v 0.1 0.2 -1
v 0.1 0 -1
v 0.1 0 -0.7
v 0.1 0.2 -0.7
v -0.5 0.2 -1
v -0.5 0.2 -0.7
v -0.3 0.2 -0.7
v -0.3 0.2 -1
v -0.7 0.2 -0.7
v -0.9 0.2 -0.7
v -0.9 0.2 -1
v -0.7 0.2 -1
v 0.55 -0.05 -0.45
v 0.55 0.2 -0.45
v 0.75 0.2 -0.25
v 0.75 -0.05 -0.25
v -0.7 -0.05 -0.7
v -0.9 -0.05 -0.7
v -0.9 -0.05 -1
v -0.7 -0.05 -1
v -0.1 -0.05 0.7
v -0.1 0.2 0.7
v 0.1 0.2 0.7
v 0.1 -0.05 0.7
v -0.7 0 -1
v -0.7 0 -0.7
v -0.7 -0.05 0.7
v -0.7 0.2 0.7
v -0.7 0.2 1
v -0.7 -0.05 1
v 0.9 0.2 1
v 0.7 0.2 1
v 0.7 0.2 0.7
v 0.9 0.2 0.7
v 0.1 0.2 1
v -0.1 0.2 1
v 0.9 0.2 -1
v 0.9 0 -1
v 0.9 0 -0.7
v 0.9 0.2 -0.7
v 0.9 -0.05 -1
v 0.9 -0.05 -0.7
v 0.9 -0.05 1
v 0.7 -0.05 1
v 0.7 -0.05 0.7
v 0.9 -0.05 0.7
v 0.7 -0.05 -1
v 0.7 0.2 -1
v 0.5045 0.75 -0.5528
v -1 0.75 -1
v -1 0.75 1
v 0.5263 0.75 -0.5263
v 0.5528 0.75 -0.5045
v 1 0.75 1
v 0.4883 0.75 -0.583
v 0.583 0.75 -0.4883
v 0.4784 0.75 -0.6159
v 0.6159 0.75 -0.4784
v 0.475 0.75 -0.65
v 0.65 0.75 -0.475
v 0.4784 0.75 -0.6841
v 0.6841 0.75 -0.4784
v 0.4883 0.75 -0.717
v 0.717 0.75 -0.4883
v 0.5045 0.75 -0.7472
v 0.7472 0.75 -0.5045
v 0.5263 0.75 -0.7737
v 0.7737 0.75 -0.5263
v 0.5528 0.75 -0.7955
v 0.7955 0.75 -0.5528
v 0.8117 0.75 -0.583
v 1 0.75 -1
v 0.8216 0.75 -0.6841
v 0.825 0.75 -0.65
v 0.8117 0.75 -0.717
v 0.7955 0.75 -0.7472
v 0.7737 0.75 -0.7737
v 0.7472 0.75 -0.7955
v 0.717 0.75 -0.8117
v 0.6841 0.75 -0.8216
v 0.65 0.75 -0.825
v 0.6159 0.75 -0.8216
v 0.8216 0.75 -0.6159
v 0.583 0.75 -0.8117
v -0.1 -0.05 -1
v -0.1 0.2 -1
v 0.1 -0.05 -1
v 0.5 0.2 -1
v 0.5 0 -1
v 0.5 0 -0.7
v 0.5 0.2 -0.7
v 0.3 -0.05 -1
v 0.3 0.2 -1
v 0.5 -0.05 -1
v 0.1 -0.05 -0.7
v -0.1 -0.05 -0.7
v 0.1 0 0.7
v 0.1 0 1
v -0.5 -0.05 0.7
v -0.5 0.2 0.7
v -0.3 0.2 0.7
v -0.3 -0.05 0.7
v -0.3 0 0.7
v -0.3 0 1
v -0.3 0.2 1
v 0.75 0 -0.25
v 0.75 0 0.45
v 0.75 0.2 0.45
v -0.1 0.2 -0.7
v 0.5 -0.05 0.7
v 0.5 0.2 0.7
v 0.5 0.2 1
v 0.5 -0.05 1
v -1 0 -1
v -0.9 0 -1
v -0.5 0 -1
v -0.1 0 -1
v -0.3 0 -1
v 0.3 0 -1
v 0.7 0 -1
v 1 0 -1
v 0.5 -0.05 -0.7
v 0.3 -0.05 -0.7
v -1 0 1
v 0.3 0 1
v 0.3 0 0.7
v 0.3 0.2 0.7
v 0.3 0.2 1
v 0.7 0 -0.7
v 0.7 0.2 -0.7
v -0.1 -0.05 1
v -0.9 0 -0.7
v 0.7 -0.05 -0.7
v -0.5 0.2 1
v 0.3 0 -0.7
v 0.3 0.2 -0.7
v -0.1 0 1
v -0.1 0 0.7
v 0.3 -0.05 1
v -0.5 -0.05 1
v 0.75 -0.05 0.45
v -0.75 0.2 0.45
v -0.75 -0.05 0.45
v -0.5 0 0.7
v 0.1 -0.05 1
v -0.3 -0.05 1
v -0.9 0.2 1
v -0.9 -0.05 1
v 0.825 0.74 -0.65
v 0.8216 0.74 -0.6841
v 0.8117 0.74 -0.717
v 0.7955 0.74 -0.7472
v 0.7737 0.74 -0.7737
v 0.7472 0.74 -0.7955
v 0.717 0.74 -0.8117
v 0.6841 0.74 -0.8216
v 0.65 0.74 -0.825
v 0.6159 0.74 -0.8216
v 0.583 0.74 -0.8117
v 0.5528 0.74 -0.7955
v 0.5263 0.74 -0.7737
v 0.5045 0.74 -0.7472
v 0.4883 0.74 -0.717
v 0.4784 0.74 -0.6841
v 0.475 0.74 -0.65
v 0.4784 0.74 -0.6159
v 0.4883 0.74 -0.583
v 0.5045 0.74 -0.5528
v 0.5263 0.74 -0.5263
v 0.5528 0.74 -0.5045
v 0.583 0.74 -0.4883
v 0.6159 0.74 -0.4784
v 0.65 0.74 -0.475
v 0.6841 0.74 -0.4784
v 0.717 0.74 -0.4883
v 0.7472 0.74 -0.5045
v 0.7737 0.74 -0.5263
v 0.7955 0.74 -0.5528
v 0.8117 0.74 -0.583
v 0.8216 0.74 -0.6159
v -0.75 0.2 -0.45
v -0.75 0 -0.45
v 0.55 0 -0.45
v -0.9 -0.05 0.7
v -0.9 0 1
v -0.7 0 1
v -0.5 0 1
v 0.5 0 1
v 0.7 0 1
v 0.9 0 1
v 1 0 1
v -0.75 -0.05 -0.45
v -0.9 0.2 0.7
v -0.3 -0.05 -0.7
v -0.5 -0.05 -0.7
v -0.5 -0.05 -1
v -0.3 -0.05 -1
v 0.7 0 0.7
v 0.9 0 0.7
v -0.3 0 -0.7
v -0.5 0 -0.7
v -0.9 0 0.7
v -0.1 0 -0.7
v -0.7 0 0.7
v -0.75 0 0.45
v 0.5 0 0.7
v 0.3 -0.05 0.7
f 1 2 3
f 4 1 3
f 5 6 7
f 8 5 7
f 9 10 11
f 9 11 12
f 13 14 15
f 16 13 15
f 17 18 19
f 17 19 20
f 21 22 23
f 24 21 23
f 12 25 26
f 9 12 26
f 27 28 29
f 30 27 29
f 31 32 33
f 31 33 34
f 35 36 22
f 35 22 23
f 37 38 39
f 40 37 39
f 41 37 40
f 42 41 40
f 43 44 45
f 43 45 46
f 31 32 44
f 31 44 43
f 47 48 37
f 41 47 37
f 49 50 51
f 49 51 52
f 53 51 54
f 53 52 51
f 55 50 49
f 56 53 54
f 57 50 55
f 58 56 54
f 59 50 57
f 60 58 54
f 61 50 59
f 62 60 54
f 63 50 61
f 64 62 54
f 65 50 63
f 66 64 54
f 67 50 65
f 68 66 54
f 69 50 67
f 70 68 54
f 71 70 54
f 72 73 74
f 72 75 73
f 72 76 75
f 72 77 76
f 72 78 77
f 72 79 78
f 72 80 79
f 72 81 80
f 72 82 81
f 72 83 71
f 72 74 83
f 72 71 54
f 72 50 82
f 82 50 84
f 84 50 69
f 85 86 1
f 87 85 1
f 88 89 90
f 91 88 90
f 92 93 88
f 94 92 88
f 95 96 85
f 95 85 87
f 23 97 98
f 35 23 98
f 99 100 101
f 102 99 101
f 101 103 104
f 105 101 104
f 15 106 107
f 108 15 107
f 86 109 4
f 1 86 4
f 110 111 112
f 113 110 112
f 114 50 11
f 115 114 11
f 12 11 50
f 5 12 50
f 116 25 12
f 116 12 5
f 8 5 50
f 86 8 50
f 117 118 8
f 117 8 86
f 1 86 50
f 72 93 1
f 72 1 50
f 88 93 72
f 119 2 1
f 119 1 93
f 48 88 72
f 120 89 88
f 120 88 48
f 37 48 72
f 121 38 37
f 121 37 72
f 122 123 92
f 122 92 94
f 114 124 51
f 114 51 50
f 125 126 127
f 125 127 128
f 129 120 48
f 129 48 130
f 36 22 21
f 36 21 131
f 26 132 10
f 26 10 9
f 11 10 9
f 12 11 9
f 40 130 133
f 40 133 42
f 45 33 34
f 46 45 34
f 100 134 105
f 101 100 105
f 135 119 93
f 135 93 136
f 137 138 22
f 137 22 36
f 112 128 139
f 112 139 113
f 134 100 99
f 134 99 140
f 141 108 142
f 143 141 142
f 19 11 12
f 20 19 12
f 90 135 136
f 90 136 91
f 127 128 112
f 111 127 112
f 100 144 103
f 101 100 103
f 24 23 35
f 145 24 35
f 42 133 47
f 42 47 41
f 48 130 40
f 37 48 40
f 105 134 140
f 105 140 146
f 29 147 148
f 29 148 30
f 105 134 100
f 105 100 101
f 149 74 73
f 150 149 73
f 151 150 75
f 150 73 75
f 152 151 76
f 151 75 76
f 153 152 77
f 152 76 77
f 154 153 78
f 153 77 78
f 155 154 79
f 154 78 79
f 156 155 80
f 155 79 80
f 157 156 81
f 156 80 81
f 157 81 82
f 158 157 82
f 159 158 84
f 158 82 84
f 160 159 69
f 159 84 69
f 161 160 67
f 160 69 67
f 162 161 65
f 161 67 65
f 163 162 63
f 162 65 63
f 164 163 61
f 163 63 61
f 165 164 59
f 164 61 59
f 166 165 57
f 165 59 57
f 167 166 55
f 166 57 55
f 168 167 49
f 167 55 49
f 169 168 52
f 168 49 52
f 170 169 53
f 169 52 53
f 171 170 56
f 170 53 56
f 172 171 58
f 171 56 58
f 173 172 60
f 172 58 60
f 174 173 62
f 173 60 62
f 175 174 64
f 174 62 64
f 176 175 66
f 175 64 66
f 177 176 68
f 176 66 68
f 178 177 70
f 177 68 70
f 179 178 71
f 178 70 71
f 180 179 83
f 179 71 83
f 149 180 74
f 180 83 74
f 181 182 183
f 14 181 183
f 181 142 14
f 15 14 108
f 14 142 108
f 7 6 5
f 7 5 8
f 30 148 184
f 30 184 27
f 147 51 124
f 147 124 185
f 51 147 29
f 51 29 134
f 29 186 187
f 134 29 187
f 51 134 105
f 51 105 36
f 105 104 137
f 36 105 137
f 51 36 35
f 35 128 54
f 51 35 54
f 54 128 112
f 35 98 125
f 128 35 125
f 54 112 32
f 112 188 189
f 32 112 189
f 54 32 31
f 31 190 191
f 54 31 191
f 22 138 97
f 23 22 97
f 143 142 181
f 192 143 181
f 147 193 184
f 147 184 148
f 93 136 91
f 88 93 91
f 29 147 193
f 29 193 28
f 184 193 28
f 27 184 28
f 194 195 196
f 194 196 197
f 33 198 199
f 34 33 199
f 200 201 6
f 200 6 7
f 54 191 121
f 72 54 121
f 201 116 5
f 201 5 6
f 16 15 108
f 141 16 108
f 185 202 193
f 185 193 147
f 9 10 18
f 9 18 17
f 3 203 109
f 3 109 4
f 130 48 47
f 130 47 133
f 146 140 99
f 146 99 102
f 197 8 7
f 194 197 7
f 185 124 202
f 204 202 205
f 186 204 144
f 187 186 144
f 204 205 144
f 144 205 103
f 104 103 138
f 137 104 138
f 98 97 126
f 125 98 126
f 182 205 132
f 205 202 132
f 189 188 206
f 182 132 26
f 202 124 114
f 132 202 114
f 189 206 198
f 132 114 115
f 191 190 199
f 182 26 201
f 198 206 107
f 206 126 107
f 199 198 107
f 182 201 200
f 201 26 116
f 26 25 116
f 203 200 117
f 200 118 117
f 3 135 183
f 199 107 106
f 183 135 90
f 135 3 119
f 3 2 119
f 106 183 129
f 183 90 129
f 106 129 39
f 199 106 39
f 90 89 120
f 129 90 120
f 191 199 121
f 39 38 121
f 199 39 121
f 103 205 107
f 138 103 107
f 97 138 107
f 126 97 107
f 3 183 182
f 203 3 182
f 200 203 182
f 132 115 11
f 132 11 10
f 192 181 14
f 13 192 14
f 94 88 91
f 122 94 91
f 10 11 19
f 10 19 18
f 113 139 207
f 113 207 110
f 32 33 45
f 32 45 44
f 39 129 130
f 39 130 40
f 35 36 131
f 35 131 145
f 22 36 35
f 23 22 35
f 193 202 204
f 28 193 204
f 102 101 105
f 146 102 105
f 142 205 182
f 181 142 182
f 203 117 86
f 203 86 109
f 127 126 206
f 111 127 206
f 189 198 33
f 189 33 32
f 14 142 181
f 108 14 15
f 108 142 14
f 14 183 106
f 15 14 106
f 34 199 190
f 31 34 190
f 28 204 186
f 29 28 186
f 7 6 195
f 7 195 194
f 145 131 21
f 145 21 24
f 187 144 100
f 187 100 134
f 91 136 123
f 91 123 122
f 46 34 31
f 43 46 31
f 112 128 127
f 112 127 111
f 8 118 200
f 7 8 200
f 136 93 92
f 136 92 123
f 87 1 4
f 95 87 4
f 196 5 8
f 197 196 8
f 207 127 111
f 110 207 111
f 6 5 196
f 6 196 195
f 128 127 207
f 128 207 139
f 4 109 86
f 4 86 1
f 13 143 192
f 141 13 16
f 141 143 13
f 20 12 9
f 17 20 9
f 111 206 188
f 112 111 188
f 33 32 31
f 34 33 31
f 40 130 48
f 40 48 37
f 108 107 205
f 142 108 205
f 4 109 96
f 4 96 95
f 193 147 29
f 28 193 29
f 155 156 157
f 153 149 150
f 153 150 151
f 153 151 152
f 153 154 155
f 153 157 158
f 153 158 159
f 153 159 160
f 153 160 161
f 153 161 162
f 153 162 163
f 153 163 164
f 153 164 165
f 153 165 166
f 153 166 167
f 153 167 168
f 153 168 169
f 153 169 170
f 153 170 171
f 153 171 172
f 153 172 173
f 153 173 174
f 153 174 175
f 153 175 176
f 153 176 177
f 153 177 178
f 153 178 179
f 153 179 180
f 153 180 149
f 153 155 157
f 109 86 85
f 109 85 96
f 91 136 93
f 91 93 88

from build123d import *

# Parameters (mm, degrees)
SKETCH1_W              = 2
SKETCH1_H              = 2
BOSS_EXTRUDE1_DEPTH    = 0.75
SKETCH2_W              = 0.2
SKETCH2_H              = 0.3
CUT_EXTRUDE1_DEPTH     = 0.2
SKETCH3_W              = 0.2
SKETCH3_H              = 0.3
BOSS_EXTRUDE2_DEPTH    = 0.25
BOSS_EXTRUDE2_2_DEPTH  = 0.25
BOSS_EXTRUDE2_3_DEPTH  = 0.25
BOSS_EXTRUDE2_4_DEPTH  = 0.25
BOSS_EXTRUDE2_5_DEPTH  = 0.25
BOSS_EXTRUDE2_6_DEPTH  = 0.25
BOSS_EXTRUDE2_7_DEPTH  = 0.25
BOSS_EXTRUDE2_8_DEPTH  = 0.25
BOSS_EXTRUDE2_9_DEPTH  = 0.25
BOSS_EXTRUDE2_10_DEPTH = 0.25
BOSS_EXTRUDE2_11_DEPTH = 0.25
SKETCH4_R              = 0.175
CUT_EXTRUDE2_DEPTH     = 0.01


with BuildPart() as part:
    # Sketch1 → Boss-Extrude1 (new body)
    with BuildSketch(Plane(origin=(0, 0, 0), x_dir=(1, 0, 0), z_dir=(0, 1, 0))):
        Rectangle(SKETCH1_W, SKETCH1_H)
    extrude(amount=BOSS_EXTRUDE1_DEPTH)

    # Sketch2 → Cut-Extrude1 (cut)
    with BuildSketch(Plane.XZ):
        Polygon((0.75, 0.45), (-0.75, 0.45), (-0.75, -0.45), (0.55, -0.45), (0.75, -0.25), align=None)
        with Locations((-0.8, 0.85)):
            Rectangle(SKETCH2_W, SKETCH2_H)
        with Locations((-0.4, 0.85)):
            Rectangle(SKETCH2_W, SKETCH2_H)
        with Locations((0, 0.85)):
            Rectangle(SKETCH2_W, SKETCH2_H)
        with Locations((0.4, 0.85)):
            Rectangle(SKETCH2_W, SKETCH2_H)
        with Locations((0.8, 0.85)):
            Rectangle(SKETCH2_W, SKETCH2_H)
        with Locations((0.8, -0.85)):
            Rectangle(SKETCH2_W, SKETCH2_H)
        with Locations((0.4, -0.85)):
            Rectangle(SKETCH2_W, SKETCH2_H)
        with Locations((0, -0.85)):
            Rectangle(SKETCH2_W, SKETCH2_H)
        with Locations((-0.4, -0.85)):
            Rectangle(SKETCH2_W, SKETCH2_H)
        with Locations((-0.8, -0.85)):
            Rectangle(SKETCH2_W, SKETCH2_H)
    extrude(amount=-CUT_EXTRUDE1_DEPTH, mode=Mode.SUBTRACT)

    # Sketch4 → Cut-Extrude2 (cut)
    with BuildSketch(Plane(origin=(0, 0.75, 0), x_dir=(1, 0, 0), z_dir=(0, 1, 0))):
        with Locations((0.65, 0.65)):
            Circle(SKETCH4_R)
    extrude(amount=-CUT_EXTRUDE2_DEPTH, mode=Mode.SUBTRACT)


with BuildPart() as body_2:
    # Sketch3 → Boss-Extrude2 (new body)
    with BuildSketch(Plane.XZ.offset(-0.2)):
        with Locations((-0.8, -0.85)):
            Rectangle(SKETCH3_W, SKETCH3_H)
    extrude(amount=BOSS_EXTRUDE2_DEPTH)


with BuildPart() as body_3:
    # Sketch3 → Boss-Extrude2 2 (new body)
    with BuildSketch(Plane.XZ.offset(-0.2)):
        with Locations((-0.4, -0.85)):
            Rectangle(SKETCH3_W, SKETCH3_H)
    extrude(amount=BOSS_EXTRUDE2_2_DEPTH)


with BuildPart() as body_4:
    # Sketch3 → Boss-Extrude2 3 (new body)
    with BuildSketch(Plane.XZ.offset(-0.2)):
        with Locations((0, -0.85)):
            Rectangle(SKETCH3_W, SKETCH3_H)
    extrude(amount=BOSS_EXTRUDE2_3_DEPTH)


with BuildPart() as body_5:
    # Sketch3 → Boss-Extrude2 4 (new body)
    with BuildSketch(Plane.XZ.offset(-0.2)):
        with Locations((0.8, -0.85)):
            Rectangle(SKETCH3_W, SKETCH3_H)
    extrude(amount=BOSS_EXTRUDE2_4_DEPTH)


with BuildPart() as body_6:
    # Sketch3 → Boss-Extrude2 5 (new body)
    with BuildSketch(Plane.XZ.offset(-0.2)):
        with Locations((0.4, -0.85)):
            Rectangle(SKETCH3_W, SKETCH3_H)
    extrude(amount=BOSS_EXTRUDE2_5_DEPTH)


with BuildPart() as body_7:
    # Sketch3 → Boss-Extrude2 6 (new body)
    with BuildSketch(Plane.XZ.offset(-0.2)):
        Polygon((0.75, 0.45), (-0.75, 0.45), (-0.75, -0.45), (0.55, -0.45), (0.75, -0.25), align=None)
    extrude(amount=BOSS_EXTRUDE2_6_DEPTH)


with BuildPart() as body_8:
    # Sketch3 → Boss-Extrude2 7 (new body)
    with BuildSketch(Plane.XZ.offset(-0.2)):
        with Locations((0.8, 0.85)):
            Rectangle(SKETCH3_W, SKETCH3_H)
    extrude(amount=BOSS_EXTRUDE2_7_DEPTH)


with BuildPart() as body_9:
    # Sketch3 → Boss-Extrude2 8 (new body)
    with BuildSketch(Plane.XZ.offset(-0.2)):
        with Locations((0.4, 0.85)):
            Rectangle(SKETCH3_W, SKETCH3_H)
    extrude(amount=BOSS_EXTRUDE2_8_DEPTH)


with BuildPart() as body_10:
    # Sketch3 → Boss-Extrude2 9 (new body)
    with BuildSketch(Plane.XZ.offset(-0.2)):
        with Locations((0, 0.85)):
            Rectangle(SKETCH3_W, SKETCH3_H)
    extrude(amount=BOSS_EXTRUDE2_9_DEPTH)


with BuildPart() as body_11:
    # Sketch3 → Boss-Extrude2 10 (new body)
    with BuildSketch(Plane.XZ.offset(-0.2)):
        with Locations((-0.4, 0.85)):
            Rectangle(SKETCH3_W, SKETCH3_H)
    extrude(amount=BOSS_EXTRUDE2_10_DEPTH)


with BuildPart() as body_12:
    # Sketch3 → Boss-Extrude2 11 (new body)
    with BuildSketch(Plane.XZ.offset(-0.2)):
        with Locations((-0.8, 0.85)):
            Rectangle(SKETCH3_W, SKETCH3_H)
    extrude(amount=BOSS_EXTRUDE2_11_DEPTH)


solid = Compound([part.part, body_2.part, body_3.part, body_4.part, body_5.part, body_6.part, body_7.part, body_8.part, body_9.part, body_10.part, body_11.part, body_12.part])
